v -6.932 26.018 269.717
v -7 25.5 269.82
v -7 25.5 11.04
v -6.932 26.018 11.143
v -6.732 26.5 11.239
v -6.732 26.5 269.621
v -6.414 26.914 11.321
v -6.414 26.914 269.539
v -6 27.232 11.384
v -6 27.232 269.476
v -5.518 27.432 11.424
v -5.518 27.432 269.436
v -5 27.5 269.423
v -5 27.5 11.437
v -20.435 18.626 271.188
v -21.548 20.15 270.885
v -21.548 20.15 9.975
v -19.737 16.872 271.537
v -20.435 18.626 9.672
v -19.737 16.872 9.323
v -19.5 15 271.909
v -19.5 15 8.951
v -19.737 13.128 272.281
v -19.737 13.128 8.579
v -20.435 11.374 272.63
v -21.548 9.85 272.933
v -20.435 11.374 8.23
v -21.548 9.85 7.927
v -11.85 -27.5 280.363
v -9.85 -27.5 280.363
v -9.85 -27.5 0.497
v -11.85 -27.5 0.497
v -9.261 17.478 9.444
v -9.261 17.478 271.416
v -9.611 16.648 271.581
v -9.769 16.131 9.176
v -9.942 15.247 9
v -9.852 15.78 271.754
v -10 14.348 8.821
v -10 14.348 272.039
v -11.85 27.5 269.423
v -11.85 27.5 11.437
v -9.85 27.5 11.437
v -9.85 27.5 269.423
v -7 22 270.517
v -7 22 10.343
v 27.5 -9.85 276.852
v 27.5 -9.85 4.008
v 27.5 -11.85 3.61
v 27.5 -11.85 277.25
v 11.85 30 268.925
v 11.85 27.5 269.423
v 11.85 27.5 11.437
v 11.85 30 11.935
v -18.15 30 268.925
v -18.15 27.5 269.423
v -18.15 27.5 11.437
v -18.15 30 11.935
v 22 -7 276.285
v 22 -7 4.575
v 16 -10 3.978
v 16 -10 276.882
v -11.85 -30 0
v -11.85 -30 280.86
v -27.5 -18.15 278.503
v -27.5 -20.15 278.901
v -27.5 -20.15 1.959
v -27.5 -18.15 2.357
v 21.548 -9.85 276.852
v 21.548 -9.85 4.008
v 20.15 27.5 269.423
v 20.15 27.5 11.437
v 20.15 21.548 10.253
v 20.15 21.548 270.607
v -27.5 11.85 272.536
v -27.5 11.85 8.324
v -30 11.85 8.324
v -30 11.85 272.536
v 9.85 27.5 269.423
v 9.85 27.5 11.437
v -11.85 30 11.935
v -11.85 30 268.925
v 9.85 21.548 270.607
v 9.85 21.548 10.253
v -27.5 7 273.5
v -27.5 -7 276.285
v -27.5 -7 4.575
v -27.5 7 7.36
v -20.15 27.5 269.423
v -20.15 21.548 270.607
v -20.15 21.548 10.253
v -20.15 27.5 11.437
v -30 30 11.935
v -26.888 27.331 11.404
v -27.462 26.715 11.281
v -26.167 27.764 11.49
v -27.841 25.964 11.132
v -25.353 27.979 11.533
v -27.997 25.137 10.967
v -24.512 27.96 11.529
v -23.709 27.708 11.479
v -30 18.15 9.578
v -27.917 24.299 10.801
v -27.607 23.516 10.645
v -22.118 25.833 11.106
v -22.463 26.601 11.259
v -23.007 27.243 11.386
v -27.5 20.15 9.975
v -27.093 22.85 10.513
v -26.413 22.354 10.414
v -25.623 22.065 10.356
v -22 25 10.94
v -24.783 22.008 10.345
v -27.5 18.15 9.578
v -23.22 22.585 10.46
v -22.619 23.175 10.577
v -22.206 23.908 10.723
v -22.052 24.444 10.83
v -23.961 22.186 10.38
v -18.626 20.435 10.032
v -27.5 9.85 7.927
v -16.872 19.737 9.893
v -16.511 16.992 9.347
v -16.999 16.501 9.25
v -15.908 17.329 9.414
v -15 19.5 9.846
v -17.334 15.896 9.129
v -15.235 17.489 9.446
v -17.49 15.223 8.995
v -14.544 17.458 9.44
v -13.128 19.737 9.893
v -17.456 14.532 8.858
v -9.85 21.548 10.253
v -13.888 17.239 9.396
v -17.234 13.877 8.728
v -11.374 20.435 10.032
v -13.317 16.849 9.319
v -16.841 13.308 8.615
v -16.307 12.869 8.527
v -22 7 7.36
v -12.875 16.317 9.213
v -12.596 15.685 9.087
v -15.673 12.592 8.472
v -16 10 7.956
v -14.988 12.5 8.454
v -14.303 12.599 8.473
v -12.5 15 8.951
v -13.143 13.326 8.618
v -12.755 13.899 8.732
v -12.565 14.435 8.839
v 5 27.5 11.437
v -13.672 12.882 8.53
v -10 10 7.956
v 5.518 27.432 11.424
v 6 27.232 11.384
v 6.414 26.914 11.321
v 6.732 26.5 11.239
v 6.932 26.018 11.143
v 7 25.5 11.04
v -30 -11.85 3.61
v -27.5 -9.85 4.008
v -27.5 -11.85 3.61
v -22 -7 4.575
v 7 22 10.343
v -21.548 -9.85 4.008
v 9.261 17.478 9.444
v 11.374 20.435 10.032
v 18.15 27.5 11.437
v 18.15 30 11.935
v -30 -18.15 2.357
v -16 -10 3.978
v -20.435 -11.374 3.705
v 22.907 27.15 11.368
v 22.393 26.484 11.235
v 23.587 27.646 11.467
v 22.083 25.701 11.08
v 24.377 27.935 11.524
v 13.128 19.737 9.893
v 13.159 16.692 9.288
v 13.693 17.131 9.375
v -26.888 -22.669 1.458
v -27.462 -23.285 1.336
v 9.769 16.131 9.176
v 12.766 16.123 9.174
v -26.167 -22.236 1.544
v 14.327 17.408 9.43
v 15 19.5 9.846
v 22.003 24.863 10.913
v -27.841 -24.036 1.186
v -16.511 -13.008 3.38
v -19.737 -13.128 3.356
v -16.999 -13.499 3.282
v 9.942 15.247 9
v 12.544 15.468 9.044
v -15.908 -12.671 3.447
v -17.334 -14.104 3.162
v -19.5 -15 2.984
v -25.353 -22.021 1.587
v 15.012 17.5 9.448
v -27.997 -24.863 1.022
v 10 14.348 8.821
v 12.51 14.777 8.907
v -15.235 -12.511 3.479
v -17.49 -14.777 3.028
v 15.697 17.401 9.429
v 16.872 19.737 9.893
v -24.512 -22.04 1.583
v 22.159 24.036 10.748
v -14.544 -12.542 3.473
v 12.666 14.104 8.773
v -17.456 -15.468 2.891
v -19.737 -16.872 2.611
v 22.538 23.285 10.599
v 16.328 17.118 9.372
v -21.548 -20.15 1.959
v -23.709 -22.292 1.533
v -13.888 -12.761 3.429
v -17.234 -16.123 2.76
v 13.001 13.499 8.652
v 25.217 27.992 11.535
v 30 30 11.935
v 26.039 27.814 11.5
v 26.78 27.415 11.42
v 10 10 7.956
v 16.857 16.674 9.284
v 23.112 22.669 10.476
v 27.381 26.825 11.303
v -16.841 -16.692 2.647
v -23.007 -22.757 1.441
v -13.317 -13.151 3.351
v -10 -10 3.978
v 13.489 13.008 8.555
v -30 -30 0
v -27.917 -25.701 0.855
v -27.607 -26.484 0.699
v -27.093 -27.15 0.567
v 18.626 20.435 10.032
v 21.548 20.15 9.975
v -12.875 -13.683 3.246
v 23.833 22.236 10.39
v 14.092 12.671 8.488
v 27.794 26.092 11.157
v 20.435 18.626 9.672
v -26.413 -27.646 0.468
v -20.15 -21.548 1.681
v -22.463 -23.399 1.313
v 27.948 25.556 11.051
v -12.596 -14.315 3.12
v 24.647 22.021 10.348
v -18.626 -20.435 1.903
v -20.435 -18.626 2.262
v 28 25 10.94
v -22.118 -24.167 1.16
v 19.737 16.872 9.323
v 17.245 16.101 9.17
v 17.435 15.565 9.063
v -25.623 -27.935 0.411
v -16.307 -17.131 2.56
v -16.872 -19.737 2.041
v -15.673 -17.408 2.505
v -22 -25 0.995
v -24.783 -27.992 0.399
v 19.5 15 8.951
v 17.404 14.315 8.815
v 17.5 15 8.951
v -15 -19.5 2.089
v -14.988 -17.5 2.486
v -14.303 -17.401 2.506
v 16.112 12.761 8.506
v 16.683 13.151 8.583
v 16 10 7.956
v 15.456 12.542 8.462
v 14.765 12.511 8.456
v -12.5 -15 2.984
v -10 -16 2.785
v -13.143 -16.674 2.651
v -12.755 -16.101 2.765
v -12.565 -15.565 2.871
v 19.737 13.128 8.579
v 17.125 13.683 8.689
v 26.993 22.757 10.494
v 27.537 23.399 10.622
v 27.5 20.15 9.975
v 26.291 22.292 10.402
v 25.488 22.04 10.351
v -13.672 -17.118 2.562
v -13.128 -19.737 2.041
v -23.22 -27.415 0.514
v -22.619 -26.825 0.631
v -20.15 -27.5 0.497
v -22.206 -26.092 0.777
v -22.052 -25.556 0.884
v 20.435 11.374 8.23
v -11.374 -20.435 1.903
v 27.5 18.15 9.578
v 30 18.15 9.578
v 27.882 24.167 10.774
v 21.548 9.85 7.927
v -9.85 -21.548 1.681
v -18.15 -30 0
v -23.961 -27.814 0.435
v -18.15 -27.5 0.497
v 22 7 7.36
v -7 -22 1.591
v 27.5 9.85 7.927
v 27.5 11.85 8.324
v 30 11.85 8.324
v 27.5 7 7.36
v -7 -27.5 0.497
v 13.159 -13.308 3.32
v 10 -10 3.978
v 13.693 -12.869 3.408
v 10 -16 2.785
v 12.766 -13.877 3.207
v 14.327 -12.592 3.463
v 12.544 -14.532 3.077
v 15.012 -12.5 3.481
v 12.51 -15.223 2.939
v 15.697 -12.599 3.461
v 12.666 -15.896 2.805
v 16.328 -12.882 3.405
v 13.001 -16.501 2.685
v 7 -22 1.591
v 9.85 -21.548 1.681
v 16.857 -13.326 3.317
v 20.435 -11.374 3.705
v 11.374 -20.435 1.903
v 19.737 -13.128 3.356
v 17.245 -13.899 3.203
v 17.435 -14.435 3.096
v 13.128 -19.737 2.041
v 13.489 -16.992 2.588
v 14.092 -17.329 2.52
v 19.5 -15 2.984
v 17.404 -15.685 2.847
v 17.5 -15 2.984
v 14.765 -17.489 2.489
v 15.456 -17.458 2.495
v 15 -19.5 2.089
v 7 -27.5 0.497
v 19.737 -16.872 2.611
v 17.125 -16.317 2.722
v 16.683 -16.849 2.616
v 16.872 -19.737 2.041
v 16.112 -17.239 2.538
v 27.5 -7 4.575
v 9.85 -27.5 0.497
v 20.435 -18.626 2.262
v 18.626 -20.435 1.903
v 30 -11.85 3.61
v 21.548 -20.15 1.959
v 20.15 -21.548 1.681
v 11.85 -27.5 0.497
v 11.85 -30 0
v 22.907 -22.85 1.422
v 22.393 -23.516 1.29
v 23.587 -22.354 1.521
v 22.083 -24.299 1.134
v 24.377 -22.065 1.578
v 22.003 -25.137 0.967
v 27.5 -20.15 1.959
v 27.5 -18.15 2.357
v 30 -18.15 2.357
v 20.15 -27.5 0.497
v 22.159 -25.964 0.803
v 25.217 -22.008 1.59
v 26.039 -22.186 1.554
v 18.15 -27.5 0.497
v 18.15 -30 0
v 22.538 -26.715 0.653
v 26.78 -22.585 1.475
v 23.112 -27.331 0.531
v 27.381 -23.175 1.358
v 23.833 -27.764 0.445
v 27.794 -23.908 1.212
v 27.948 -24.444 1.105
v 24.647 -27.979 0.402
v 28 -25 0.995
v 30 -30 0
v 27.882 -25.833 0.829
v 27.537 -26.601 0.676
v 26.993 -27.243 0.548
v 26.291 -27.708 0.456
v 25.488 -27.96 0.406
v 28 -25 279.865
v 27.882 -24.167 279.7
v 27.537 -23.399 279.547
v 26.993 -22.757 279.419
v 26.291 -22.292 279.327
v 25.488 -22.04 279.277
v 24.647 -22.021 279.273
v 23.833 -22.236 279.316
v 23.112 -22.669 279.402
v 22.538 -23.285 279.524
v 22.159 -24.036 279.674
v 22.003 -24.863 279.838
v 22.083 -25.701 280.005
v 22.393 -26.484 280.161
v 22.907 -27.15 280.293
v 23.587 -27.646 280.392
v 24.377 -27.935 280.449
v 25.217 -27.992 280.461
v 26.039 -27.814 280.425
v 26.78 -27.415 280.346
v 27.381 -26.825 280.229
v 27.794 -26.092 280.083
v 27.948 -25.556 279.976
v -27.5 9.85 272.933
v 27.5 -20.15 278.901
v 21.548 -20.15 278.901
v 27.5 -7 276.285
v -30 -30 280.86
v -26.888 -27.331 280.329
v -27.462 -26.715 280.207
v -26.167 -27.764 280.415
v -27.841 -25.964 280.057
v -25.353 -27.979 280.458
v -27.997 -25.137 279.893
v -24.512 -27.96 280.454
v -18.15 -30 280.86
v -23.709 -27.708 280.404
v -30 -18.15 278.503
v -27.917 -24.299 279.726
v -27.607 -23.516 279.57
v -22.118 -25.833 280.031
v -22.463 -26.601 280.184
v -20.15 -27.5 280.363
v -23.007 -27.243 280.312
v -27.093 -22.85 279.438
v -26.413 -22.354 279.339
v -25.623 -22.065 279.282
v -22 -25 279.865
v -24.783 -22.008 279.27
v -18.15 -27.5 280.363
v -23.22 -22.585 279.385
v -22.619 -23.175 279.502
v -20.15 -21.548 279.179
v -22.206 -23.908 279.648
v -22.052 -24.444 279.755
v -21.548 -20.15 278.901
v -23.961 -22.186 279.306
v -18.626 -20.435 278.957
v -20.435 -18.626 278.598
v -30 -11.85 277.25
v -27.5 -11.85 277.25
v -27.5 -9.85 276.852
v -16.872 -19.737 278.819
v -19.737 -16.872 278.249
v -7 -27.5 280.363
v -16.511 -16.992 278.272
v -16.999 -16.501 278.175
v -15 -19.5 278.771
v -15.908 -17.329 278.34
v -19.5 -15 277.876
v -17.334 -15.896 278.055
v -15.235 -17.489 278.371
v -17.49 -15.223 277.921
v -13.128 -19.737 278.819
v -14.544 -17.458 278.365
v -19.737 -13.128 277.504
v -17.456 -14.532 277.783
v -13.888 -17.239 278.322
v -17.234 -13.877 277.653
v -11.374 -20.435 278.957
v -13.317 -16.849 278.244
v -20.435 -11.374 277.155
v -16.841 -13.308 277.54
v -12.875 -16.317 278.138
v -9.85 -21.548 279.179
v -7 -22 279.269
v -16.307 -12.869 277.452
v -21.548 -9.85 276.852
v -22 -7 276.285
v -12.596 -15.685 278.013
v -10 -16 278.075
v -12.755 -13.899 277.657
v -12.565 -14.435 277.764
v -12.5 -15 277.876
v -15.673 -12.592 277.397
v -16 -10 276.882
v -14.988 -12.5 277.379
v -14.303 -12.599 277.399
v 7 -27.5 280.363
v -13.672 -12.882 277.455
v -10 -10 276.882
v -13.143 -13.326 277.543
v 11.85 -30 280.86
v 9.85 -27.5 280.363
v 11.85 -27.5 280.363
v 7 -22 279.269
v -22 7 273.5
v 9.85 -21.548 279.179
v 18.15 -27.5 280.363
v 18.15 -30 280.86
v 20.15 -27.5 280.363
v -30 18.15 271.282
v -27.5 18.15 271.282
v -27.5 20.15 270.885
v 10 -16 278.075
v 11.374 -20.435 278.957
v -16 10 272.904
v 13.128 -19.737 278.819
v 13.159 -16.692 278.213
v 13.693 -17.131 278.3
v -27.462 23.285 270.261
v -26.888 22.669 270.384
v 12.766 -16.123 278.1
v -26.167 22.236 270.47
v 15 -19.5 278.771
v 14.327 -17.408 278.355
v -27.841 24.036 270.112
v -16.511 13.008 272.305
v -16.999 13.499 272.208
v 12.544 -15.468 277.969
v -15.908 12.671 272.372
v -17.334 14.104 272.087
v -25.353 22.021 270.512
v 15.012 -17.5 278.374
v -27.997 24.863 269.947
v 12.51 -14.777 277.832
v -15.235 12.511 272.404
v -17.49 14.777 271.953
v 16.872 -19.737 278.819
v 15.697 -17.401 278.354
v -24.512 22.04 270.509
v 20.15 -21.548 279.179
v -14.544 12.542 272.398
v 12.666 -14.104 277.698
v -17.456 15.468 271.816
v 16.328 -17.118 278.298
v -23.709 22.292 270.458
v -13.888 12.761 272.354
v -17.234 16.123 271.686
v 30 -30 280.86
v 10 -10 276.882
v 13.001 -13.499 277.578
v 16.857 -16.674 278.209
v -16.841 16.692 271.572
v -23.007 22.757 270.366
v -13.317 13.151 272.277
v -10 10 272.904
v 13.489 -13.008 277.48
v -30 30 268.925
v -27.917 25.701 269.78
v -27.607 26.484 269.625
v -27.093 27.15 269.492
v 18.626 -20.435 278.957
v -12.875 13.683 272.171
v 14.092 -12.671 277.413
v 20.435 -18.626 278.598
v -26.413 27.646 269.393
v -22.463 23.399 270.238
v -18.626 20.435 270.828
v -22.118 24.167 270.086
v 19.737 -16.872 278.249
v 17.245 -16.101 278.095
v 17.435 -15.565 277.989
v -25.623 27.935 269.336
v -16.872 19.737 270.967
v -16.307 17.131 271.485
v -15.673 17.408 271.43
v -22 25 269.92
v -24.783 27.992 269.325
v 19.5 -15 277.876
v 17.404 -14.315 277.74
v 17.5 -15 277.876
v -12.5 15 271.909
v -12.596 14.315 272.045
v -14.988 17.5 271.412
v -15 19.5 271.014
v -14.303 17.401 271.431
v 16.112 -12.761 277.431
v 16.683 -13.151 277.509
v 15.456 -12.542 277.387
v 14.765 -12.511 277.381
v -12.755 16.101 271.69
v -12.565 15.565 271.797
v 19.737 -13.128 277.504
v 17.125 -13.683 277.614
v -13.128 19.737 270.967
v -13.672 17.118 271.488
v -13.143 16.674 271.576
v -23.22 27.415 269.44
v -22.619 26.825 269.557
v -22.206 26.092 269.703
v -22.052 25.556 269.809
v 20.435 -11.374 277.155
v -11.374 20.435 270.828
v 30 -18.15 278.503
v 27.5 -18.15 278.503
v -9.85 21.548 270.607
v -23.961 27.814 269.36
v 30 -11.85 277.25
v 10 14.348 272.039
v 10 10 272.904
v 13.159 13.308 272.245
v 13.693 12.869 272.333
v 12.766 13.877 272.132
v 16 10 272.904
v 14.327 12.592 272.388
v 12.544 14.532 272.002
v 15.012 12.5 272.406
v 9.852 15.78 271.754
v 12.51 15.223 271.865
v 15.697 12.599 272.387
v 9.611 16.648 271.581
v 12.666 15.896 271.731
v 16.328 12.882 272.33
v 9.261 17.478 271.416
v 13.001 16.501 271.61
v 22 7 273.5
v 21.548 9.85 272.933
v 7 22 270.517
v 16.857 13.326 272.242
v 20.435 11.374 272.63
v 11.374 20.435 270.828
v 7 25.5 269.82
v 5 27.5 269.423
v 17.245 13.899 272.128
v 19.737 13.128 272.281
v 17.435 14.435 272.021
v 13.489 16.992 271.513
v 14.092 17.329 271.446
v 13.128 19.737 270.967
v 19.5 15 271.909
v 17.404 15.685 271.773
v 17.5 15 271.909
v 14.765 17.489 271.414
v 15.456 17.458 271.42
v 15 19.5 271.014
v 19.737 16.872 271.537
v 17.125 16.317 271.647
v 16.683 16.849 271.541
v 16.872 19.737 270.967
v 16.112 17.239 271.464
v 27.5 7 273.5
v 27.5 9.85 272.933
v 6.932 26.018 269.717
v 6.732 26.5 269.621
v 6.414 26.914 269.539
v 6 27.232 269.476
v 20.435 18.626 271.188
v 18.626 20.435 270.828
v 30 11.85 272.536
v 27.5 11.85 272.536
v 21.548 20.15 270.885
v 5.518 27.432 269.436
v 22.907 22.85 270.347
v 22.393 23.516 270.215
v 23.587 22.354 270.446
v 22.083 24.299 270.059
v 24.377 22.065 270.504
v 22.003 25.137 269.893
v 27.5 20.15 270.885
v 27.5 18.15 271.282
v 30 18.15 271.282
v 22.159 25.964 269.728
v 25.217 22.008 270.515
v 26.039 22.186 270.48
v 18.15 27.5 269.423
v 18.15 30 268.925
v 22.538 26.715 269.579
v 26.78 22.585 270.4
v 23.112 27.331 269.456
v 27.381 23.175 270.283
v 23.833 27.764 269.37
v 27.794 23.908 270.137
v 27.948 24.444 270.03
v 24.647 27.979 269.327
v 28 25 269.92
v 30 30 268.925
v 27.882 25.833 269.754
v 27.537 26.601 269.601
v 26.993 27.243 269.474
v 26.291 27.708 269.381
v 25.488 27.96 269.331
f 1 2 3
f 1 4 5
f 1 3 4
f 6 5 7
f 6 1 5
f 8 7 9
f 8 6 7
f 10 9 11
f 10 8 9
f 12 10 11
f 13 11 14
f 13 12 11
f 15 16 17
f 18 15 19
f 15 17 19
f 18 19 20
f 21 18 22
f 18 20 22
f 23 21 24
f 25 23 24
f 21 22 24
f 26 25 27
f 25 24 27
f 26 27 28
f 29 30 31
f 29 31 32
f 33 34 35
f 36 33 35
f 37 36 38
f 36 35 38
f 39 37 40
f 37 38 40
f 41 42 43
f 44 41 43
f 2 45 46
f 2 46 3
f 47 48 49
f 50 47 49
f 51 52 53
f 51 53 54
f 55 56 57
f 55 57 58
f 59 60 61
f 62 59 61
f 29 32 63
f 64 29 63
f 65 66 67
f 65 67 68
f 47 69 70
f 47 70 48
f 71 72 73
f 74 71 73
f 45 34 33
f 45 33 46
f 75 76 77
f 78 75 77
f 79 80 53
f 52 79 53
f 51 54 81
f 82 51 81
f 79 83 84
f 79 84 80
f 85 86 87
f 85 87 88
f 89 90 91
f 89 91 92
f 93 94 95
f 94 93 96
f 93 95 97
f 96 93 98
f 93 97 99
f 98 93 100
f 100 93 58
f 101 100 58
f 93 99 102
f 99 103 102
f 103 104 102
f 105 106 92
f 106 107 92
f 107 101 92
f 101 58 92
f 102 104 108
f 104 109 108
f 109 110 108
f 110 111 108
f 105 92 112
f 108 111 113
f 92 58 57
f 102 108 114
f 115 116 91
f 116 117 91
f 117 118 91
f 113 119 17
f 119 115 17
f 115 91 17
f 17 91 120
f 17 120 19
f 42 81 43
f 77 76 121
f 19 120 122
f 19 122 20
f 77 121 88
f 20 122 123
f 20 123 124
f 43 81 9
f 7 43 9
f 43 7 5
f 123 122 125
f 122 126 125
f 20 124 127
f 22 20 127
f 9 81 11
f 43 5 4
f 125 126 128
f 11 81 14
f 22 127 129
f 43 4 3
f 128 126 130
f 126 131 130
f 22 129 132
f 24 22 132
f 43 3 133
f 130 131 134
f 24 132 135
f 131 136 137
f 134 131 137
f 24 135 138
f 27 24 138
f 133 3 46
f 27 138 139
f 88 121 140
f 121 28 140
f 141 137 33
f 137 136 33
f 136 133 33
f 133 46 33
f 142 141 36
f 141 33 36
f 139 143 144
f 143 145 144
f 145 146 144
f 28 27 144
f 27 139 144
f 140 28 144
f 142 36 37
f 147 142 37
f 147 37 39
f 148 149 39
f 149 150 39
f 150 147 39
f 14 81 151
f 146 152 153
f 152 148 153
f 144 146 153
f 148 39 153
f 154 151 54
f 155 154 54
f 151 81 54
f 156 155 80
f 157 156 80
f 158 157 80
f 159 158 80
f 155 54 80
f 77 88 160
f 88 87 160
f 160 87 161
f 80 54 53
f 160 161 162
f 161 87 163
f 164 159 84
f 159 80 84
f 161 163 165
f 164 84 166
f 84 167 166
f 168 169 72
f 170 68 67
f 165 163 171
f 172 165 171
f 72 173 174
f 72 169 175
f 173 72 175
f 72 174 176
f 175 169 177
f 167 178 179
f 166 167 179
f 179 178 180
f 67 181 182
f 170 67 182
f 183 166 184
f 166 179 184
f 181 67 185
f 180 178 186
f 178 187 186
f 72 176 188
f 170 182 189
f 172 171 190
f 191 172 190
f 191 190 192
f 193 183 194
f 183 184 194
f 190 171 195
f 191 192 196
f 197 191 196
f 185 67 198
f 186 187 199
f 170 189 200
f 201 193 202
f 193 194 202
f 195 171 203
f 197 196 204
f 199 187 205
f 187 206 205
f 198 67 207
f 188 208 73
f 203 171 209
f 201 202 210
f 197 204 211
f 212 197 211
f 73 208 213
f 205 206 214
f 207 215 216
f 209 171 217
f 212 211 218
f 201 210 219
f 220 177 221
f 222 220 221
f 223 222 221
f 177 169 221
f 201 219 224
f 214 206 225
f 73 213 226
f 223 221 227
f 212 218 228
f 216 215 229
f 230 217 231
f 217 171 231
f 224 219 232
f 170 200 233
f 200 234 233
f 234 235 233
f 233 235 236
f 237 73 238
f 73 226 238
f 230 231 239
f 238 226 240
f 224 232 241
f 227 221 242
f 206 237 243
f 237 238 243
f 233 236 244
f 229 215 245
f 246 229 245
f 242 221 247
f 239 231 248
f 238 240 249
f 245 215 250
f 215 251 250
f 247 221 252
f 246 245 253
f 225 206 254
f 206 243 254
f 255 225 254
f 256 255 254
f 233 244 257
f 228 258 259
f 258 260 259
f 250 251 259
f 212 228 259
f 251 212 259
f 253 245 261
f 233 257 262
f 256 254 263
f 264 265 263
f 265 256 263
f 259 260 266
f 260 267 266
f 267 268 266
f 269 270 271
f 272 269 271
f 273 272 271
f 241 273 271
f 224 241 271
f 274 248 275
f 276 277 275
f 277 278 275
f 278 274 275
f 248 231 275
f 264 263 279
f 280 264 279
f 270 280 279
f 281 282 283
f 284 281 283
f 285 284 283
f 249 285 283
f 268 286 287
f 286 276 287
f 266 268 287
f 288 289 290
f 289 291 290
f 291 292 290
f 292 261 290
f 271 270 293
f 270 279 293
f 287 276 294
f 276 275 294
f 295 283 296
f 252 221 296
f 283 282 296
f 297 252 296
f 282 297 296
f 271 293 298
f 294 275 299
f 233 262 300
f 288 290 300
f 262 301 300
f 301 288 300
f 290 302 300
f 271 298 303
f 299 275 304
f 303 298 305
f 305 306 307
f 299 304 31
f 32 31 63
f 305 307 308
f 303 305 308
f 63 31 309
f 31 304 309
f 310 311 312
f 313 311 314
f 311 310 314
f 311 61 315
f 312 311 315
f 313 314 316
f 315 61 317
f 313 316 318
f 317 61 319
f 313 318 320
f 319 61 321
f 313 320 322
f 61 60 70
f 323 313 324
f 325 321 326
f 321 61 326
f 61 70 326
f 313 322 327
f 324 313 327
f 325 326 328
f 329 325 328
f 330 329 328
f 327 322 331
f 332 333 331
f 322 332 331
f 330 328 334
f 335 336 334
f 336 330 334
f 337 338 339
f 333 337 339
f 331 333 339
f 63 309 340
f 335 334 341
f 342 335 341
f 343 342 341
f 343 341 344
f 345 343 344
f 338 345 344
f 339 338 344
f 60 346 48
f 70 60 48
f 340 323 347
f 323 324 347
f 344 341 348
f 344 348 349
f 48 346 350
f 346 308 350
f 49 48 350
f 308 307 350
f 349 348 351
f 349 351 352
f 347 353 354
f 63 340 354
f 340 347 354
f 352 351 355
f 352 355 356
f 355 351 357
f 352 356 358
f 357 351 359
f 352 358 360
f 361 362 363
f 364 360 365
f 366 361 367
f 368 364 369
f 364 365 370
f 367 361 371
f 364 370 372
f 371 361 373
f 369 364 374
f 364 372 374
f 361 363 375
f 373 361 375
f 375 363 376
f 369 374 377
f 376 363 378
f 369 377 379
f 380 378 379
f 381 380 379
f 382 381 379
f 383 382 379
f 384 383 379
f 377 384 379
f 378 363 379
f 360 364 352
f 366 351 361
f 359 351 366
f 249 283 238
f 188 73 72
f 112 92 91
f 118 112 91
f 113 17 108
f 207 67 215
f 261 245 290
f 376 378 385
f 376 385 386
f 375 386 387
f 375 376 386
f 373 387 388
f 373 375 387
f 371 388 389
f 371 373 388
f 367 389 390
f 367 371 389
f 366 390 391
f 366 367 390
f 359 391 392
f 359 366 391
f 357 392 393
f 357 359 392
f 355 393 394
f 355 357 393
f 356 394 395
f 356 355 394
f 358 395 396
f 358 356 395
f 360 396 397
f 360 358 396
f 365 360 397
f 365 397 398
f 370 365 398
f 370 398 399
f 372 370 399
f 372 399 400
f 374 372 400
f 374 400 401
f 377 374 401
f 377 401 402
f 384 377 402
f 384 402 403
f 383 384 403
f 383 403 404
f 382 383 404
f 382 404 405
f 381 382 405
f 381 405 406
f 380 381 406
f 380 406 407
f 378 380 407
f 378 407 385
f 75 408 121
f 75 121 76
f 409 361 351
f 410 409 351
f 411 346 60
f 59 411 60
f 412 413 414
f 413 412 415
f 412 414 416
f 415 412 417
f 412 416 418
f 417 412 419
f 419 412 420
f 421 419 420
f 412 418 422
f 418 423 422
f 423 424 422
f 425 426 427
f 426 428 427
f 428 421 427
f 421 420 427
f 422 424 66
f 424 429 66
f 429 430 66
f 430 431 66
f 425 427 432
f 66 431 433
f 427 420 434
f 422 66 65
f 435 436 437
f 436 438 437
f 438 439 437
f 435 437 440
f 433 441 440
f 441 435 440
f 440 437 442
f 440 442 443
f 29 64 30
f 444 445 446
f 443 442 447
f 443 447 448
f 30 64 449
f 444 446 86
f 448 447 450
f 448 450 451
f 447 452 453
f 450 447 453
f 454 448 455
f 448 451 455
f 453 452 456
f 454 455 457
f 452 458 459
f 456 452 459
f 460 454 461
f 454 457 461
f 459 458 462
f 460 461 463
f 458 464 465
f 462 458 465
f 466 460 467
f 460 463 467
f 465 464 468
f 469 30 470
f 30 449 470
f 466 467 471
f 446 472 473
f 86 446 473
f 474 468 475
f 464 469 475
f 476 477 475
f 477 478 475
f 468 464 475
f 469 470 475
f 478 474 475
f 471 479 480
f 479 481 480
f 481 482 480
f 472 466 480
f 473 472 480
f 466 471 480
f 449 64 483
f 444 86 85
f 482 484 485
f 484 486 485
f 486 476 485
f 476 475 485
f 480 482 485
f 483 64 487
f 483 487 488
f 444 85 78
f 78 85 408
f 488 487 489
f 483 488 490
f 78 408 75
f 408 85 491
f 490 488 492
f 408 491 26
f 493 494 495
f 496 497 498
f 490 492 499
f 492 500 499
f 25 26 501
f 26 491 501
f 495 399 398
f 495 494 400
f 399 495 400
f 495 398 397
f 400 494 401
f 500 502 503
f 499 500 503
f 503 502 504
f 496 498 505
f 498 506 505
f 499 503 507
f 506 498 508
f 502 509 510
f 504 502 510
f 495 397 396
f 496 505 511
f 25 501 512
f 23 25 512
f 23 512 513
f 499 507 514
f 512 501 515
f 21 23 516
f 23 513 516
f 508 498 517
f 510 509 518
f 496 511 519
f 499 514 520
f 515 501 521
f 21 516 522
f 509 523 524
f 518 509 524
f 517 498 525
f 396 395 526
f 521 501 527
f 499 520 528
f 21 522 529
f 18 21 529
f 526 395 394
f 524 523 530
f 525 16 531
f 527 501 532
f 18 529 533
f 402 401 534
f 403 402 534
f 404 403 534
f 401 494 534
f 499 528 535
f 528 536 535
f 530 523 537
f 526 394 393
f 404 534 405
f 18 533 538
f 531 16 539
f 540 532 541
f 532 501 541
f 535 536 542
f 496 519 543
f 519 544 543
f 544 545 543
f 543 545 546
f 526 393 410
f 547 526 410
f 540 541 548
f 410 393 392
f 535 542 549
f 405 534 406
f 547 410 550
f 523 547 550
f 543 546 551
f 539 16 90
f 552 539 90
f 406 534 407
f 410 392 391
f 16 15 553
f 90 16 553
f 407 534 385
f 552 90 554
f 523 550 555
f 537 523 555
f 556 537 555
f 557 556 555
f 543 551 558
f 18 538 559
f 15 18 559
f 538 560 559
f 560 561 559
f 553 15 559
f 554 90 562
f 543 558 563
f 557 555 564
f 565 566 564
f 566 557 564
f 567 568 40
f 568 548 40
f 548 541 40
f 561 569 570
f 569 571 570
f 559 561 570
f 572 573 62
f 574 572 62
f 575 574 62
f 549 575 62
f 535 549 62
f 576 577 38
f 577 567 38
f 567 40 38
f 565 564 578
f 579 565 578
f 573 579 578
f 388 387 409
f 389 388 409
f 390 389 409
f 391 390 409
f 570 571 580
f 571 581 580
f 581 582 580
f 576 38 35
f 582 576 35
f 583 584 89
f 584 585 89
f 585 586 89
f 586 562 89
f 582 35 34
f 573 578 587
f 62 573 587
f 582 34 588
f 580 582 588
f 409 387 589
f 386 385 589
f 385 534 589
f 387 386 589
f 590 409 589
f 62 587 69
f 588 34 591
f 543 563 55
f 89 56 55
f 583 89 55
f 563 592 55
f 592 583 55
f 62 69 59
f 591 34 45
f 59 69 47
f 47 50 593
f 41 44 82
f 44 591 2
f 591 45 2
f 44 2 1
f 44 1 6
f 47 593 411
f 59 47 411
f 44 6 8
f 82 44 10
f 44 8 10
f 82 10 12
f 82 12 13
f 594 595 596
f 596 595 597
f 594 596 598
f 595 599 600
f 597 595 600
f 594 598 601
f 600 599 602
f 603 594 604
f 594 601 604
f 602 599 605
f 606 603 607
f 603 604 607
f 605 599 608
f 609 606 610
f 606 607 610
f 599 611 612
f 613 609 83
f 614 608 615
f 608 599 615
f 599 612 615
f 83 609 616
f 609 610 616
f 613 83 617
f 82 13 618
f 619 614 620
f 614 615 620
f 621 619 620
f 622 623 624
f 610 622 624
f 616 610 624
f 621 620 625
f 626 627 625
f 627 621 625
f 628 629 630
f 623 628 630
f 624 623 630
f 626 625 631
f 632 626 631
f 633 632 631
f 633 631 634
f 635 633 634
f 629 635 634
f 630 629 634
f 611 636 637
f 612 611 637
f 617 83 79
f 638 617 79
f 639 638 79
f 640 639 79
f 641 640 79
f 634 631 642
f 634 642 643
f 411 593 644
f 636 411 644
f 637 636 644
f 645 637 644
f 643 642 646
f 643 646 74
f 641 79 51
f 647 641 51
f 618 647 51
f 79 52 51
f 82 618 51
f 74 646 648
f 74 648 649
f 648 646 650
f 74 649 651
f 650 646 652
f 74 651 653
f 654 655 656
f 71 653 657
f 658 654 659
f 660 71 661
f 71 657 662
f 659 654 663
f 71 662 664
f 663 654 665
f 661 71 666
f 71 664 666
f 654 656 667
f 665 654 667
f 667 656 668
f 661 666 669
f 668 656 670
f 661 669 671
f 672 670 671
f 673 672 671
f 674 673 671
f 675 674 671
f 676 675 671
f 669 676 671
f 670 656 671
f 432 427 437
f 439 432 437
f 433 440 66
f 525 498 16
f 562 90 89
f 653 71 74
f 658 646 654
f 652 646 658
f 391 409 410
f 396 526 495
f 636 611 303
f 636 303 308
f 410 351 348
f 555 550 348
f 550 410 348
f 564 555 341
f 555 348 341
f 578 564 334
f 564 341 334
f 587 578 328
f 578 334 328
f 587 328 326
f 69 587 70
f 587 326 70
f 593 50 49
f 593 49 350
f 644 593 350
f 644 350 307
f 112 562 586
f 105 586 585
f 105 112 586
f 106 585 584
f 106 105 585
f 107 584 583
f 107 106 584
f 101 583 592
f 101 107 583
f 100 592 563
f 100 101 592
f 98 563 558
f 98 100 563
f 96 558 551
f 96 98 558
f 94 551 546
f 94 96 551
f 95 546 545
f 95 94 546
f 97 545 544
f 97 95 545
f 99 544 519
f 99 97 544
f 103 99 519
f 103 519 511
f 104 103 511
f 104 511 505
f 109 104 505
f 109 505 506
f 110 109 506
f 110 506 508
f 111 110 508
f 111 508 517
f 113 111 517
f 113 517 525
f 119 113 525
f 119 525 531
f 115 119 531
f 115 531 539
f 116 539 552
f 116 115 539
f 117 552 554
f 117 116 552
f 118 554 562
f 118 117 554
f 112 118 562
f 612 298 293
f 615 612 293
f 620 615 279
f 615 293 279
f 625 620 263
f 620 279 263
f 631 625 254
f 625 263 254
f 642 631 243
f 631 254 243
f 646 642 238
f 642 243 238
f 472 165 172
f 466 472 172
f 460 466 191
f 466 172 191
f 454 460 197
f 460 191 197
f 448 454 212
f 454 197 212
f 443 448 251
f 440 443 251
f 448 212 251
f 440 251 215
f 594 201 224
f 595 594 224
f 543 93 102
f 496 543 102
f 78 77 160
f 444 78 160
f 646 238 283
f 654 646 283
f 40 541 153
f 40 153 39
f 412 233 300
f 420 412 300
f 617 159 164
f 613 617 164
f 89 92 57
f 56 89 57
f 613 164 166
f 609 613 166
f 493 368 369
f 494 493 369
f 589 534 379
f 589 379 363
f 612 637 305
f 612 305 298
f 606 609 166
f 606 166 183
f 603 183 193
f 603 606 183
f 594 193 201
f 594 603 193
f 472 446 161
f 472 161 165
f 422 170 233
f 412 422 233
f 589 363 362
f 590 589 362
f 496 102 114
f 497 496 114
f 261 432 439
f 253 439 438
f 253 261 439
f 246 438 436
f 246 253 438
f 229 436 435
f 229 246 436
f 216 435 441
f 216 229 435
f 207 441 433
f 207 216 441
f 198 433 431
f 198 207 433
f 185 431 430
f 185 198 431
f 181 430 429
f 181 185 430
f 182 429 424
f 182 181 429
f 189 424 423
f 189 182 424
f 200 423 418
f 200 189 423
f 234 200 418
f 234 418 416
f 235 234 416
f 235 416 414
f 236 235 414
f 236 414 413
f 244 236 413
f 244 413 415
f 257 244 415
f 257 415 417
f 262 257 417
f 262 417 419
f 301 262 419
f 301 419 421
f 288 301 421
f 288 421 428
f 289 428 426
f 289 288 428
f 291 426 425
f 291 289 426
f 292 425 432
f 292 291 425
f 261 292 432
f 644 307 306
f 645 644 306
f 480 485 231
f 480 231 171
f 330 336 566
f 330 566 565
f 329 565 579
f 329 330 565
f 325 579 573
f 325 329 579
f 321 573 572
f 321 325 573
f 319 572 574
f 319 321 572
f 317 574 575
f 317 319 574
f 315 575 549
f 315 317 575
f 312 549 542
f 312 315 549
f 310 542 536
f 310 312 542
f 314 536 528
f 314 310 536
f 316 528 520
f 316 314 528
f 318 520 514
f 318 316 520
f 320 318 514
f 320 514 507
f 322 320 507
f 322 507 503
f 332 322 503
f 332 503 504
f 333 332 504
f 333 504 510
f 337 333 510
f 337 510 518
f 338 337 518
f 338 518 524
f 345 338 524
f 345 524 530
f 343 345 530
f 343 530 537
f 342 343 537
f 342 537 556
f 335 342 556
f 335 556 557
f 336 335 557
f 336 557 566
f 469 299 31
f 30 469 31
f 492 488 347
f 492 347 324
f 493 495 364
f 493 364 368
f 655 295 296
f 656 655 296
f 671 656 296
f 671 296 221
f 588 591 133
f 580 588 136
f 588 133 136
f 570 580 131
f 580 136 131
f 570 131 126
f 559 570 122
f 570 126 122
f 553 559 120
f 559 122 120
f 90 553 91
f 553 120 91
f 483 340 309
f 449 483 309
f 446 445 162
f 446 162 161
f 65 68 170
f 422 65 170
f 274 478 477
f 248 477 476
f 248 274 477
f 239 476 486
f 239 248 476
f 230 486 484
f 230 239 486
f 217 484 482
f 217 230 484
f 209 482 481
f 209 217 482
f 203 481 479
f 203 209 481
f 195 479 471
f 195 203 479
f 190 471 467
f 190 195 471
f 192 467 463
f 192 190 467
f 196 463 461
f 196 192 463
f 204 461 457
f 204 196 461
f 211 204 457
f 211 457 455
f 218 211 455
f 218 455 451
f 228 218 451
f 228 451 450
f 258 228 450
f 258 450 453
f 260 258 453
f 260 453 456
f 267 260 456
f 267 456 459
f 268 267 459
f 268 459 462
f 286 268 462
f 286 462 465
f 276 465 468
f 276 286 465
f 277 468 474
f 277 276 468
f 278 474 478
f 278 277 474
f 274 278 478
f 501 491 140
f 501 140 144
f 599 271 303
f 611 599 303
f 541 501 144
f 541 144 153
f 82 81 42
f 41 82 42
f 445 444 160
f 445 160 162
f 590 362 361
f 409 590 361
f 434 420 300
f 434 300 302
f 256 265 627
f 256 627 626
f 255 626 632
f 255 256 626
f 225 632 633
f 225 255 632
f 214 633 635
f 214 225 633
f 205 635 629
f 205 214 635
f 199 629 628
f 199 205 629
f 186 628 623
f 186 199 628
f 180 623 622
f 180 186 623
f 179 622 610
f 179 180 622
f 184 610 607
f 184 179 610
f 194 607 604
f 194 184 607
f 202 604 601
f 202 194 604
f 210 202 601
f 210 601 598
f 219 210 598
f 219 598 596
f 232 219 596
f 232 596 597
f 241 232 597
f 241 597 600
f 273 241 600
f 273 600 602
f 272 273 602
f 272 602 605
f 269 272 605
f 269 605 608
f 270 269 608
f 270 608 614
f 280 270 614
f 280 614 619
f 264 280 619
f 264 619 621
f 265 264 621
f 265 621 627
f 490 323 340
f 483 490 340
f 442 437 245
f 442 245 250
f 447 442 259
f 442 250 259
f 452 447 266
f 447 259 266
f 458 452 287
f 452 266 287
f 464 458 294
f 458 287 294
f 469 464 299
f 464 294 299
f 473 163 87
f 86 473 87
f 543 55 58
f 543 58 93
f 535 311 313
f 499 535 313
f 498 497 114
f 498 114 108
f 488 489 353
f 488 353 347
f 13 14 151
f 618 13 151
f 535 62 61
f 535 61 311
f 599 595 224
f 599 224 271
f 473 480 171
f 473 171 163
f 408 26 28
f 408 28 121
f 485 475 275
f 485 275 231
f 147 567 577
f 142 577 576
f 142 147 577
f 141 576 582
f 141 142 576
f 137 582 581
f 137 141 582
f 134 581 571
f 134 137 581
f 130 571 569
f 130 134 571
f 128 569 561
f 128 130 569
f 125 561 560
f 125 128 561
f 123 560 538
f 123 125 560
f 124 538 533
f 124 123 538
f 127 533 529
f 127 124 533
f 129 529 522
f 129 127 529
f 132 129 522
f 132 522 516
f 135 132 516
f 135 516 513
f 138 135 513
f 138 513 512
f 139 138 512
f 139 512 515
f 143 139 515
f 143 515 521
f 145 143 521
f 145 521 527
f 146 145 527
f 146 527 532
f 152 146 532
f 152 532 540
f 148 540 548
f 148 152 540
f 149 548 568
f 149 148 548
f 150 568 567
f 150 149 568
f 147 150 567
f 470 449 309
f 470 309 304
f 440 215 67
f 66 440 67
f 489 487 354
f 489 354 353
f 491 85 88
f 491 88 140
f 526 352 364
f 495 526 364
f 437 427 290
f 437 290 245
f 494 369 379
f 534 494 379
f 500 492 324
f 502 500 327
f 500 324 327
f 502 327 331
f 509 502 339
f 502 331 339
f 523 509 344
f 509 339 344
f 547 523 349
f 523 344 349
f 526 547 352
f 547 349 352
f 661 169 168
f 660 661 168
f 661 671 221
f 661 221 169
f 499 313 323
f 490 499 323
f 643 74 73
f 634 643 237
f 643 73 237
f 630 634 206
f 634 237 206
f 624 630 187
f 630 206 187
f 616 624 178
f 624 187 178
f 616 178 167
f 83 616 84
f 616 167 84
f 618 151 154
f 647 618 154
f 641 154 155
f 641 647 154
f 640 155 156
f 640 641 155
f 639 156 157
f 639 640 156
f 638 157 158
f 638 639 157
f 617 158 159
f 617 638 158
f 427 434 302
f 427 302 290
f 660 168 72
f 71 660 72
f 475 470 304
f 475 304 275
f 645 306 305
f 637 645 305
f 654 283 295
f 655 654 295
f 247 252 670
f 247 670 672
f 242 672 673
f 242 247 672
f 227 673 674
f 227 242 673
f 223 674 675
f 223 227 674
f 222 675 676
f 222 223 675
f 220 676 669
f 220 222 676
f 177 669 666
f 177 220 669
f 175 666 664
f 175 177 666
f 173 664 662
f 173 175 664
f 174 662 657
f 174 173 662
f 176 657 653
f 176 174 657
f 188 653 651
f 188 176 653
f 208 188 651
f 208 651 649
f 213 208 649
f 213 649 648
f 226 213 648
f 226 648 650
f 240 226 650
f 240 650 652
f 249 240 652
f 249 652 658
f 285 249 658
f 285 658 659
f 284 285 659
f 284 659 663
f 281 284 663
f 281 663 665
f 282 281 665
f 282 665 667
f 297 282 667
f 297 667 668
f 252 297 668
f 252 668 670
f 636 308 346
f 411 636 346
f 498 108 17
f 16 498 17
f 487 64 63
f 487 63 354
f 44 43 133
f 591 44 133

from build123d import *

# Parameters (mm, degrees)
F0_R          = 3
F0_R_2        = 2.5
F1_DEPTH      = 280.86
F2_R          = 2
F3_R          = 7
F6_DEPTH      = 30
F6_DEPTH_BACK = 30


# Not quite as in the source:
# - a feature names something its author has since deleted; it is built from what else it names


with BuildPart() as f1:
    # F0 (on Top) → F1 (new body)
    with BuildSketch(Plane.XY):
        with BuildLine():
            Line((18.15, -30), (30, -30))
            Line((30, -30), (30, -18.15))
            Line((30, -18.15), (27.5, -18.15))
            Line((27.5, -18.15), (27.5, -20.15))
            Line((27.5, -20.15), (21.5477069044, -20.15))
            ThreePointArc((21.5477069044, -20.15), (19.5, -15), (21.5477069044, -9.85))
            Line((21.5477069044, -9.85), (27.5, -9.85))
            Line((27.5, -9.85), (27.5, -11.85))
            Line((27.5, -11.85), (30, -11.85))
            Line((30, -11.85), (30, 11.85))
            Line((30, 11.85), (27.5, 11.85))
            Line((27.5, 11.85), (27.5, 9.85))
            Line((27.5, 9.85), (21.5477069044, 9.85))
            ThreePointArc((21.5477069044, 9.85), (19.5, 15), (21.5477069044, 20.15))
            Line((21.5477069044, 20.15), (27.5, 20.15))
            Line((27.5, 20.15), (27.5, 18.15))
            Line((27.5, 18.15), (30, 18.15))
            Line((30, 18.15), (30, 30))
            Line((30, 30), (18.15, 30))
            Line((18.15, 30), (18.15, 27.5))
            Line((18.15, 27.5), (20.15, 27.5))
            Line((20.15, 27.5), (20.15, 21.5477069044))
            ThreePointArc((20.15, 21.5477069044), (15, 19.5), (9.85, 21.5477069044))
            Line((9.85, 21.5477069044), (9.85, 27.5))
            Line((9.85, 27.5), (11.85, 27.5))
            Line((11.85, 27.5), (11.85, 30))
            Line((11.85, 30), (-11.85, 30))
            Line((-11.85, 30), (-11.85, 27.5))
            Line((-11.85, 27.5), (-9.85, 27.5))
            Line((-9.85, 27.5), (-9.85, 21.5477069044))
            ThreePointArc((-9.85, 21.5477069044), (-15, 19.5), (-20.15, 21.5477069044))
            Line((-20.15, 21.5477069044), (-20.15, 27.5))
            Line((-20.15, 27.5), (-18.15, 27.5))
            Line((-18.15, 27.5), (-18.15, 30))
            Line((-18.15, 30), (-30, 30))
            Line((-30, 30), (-30, 18.15))
            Line((-30, 18.15), (-27.5, 18.15))
            Line((-27.5, 18.15), (-27.5, 20.15))
            Line((-27.5, 20.15), (-21.5477069044, 20.15))
            ThreePointArc((-21.5477069044, 20.15), (-19.5, 15), (-21.5477069044, 9.85))
            Line((-21.5477069044, 9.85), (-27.5, 9.85))
            Line((-27.5, 9.85), (-27.5, 11.85))
            Line((-27.5, 11.85), (-30, 11.85))
            Line((-30, 11.85), (-30, -11.85))
            Line((-30, -11.85), (-27.5, -11.85))
            Line((-27.5, -11.85), (-27.5, -9.85))
            Line((-27.5, -9.85), (-21.5477069044, -9.85))
            ThreePointArc((-21.5477069044, -9.85), (-19.5, -15), (-21.5477069044, -20.15))
            Line((-21.5477069044, -20.15), (-27.5, -20.15))
            Line((-27.5, -20.15), (-27.5, -18.15))
            Line((-27.5, -18.15), (-30, -18.15))
            Line((-30, -18.15), (-30, -30))
            Line((-30, -30), (-18.15, -30))
            Line((-18.15, -30), (-18.15, -27.5))
            Line((-18.15, -27.5), (-20.15, -27.5))
            Line((-20.15, -27.5), (-20.15, -21.5477069044))
            ThreePointArc((-20.15, -21.5477069044), (-15, -19.5), (-9.85, -21.5477069044))
            Line((-9.85, -21.5477069044), (-9.85, -27.5))
            Line((-9.85, -27.5), (-11.85, -27.5))
            Line((-11.85, -27.5), (-11.85, -30))
            Line((-11.85, -30), (11.85, -30))
            Line((11.85, -30), (11.85, -27.5))
            Line((11.85, -27.5), (9.85, -27.5))
            Line((9.85, -27.5), (9.85, -21.5477069044))
            ThreePointArc((9.85, -21.5477069044), (15, -19.5), (20.15, -21.5477069044))
            Line((20.15, -21.5477069044), (20.15, -27.5))
            Line((20.15, -27.5), (18.15, -27.5))
            Line((18.15, -27.5), (18.15, -30))
        make_face()
        with Locations((-25, -25)):
            Circle(F0_R, mode=Mode.SUBTRACT)
        with Locations((-15, -15)):
            Circle(F0_R_2, mode=Mode.SUBTRACT)
        with Locations((25, -25)):
            Circle(F0_R, mode=Mode.SUBTRACT)
        with Locations((15, -15)):
            Circle(F0_R_2, mode=Mode.SUBTRACT)
        with Locations((-25, 25)):
            Circle(F0_R, mode=Mode.SUBTRACT)
        with Locations((-15, 15)):
            Circle(F0_R_2, mode=Mode.SUBTRACT)
        Polygon((-7, 22), (-7, 27.5), (0, 27.5), (7, 27.5), (7, 22), (10, 16), (10, 10), (16, 10), (22, 7), (27.5, 7), (27.5, 0), (27.5, -7), (22, -7), (16, -10), (10, -10), (10, -16), (7, -22), (7, -27.5), (0, -27.5), (-7, -27.5), (-7, -22), (-10, -16), (-10, -10), (-16, -10), (-22, -7), (-27.5, -7), (-27.5, 0), (-27.5, 7), (-22, 7), (-16, 10), (-10, 10), (-10, 16), align=None, mode=Mode.SUBTRACT)
        with Locations((15, 15)):
            Circle(F0_R_2, mode=Mode.SUBTRACT)
        with Locations((25, 25)):
            Circle(F0_R, mode=Mode.SUBTRACT)
    extrude(amount=F1_DEPTH)

    # F2
    f2_edges = [f1.edges().sort_by_distance(p)[0] for p in [
        (-7, 27.5, 140.43),
        (7, 27.5, 140.43),
    ]]
    fillet(f2_edges, radius=F2_R)

    # F3
    f3_edges = [f1.edges().sort_by_distance(p)[0] for p in [
        (-10, 16, 140.43),
        (10, 16, 140.43),
    ]]
    fillet(f3_edges, radius=F3_R)

    # F5 (on Right) → F6 (cut, two sides)
    with BuildSketch(Plane.YZ) as f6_sk:
        Polygon((166.5976946582, -66.7170951811), (146.3493769552, 35.0780720561), (-30, 0), (-9.751682297, -101.7951672372), align=None)
        Polygon((135.5963626007, 247.9208354856), (151.7094622056, 328.9268574701), (-13.8869003951, 361.8660219845), (-30, 280.86), align=None)
    extrude(amount=F6_DEPTH, mode=Mode.SUBTRACT)
    extrude(f6_sk.sketch, amount=-F6_DEPTH_BACK, mode=Mode.SUBTRACT)


solid = f1.part
